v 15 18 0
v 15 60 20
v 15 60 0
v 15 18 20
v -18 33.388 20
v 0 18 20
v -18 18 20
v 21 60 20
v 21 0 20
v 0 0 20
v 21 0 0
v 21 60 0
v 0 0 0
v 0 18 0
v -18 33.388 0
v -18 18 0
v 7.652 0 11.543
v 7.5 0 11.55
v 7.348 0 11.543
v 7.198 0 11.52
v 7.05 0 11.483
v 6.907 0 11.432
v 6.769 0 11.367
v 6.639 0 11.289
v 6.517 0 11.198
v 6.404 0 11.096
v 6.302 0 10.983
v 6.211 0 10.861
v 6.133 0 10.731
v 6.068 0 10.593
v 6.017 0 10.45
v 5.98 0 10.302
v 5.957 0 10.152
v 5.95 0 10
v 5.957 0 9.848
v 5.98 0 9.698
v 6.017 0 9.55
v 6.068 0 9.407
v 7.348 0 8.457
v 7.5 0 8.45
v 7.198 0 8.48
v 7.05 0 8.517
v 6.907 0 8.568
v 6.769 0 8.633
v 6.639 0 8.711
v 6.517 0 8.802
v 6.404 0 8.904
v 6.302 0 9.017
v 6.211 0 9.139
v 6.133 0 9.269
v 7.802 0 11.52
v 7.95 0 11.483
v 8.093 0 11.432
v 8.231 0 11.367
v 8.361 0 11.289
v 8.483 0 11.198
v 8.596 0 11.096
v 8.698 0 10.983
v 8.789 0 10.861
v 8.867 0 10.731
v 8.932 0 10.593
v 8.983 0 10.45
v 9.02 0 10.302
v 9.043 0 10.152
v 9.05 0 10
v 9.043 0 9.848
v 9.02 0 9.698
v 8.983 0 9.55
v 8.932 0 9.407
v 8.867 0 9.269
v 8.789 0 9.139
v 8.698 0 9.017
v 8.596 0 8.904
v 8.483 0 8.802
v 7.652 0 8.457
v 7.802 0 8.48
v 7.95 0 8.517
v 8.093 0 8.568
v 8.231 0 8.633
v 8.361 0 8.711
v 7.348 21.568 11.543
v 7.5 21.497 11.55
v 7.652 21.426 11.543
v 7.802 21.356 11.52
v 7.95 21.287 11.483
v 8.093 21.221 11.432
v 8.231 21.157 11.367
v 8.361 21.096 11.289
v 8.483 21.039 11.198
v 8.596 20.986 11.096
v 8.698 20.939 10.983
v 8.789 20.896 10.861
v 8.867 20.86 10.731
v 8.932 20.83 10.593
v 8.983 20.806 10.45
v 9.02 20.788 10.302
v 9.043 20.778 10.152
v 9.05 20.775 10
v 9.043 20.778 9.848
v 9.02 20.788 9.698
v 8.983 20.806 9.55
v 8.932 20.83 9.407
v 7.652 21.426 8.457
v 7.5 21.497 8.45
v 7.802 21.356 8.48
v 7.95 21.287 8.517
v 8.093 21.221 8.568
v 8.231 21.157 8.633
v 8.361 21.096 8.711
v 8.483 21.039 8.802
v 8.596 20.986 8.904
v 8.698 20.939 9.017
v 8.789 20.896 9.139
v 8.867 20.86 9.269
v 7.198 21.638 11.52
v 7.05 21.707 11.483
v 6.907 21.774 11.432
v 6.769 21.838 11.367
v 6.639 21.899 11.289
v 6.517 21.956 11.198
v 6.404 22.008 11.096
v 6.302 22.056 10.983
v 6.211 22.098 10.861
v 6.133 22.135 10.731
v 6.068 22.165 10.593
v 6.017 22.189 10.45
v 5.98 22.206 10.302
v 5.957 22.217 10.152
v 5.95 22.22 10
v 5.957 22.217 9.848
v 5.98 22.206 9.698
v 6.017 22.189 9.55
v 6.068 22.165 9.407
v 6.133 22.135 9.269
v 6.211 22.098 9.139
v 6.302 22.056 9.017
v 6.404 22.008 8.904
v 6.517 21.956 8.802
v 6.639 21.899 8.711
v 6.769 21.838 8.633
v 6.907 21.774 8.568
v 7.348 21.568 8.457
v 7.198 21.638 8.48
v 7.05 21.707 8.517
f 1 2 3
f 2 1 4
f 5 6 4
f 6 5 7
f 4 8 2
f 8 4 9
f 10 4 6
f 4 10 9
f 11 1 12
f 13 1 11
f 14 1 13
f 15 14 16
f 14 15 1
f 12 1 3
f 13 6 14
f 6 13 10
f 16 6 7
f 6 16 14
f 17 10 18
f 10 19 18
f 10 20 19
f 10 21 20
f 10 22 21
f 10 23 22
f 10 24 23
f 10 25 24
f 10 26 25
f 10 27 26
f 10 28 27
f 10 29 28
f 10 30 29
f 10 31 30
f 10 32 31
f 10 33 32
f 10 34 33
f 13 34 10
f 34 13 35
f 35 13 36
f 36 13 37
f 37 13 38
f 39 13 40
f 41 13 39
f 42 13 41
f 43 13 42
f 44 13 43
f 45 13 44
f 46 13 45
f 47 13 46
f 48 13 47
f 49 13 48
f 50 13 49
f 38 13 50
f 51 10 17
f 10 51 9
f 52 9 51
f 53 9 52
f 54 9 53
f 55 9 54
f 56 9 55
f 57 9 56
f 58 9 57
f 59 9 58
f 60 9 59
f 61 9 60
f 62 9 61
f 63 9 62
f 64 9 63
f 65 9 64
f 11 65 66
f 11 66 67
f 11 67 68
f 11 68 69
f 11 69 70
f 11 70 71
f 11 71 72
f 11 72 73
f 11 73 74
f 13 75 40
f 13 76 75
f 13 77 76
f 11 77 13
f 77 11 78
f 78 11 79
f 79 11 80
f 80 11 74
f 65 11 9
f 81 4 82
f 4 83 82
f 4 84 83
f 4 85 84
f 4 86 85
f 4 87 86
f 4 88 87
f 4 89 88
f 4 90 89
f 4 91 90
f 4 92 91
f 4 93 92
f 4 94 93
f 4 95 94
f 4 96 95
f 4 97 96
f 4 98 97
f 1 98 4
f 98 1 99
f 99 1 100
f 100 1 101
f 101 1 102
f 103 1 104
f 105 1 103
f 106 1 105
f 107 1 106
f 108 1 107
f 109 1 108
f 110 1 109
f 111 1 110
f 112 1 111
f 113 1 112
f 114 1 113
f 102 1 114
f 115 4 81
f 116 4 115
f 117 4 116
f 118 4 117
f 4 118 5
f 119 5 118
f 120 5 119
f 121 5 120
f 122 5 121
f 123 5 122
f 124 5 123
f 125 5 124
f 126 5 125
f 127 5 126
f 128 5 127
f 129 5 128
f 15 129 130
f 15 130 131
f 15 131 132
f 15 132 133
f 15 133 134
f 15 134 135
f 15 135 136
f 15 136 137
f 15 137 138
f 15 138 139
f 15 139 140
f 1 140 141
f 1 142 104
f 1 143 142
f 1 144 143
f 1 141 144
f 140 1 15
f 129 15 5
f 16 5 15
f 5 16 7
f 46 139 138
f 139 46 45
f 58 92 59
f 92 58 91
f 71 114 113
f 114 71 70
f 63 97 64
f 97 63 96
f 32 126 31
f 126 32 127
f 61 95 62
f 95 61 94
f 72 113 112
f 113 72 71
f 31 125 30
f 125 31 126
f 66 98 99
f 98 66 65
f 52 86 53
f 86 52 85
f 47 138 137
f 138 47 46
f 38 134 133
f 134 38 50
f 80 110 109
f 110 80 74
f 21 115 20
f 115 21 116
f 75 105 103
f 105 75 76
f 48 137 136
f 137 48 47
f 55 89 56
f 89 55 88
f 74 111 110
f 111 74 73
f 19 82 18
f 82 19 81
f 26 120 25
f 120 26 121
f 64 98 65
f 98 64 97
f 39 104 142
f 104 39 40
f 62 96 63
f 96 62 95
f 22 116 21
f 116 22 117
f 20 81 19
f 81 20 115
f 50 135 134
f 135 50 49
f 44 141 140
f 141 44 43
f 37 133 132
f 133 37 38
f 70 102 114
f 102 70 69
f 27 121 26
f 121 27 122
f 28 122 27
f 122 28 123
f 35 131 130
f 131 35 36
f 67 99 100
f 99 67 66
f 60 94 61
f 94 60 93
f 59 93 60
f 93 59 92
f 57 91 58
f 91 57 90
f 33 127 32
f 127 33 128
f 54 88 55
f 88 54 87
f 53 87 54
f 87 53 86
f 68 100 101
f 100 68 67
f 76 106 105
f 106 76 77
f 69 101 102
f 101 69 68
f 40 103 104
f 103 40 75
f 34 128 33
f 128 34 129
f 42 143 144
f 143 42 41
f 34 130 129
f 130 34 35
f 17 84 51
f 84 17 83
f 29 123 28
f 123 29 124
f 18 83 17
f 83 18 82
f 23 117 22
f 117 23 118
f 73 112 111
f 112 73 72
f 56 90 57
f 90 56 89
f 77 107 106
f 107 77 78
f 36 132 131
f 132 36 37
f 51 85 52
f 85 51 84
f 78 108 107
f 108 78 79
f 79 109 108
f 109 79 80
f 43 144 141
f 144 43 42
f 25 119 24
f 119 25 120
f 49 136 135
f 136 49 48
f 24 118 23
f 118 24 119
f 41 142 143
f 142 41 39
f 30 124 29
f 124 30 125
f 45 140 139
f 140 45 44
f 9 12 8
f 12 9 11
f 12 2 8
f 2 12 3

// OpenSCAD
board_thickness = 15;
tool_thickness = 6;
tool_height = 20;
drill_diameter = 3.1;
angle = 25;
$fn = 64;

// Derived values, do not edit
a = (3 * tool_thickness + board_thickness);
b = a * tan(angle);

module angledWedge() {        
    linear_extrude(height = tool_height)
        polygon([[0,0], [a, 0], [0, b]]);
}


difference() {
    union() {
        cube([board_thickness, 3 * tool_thickness, tool_height]);        
        translate([- 3 * tool_thickness, 3 * tool_thickness, 0])
            angledWedge();
    }
    translate([board_thickness/2, 6 * tool_thickness, tool_height/2])
        rotate([90, 0, 0]) 
            cylinder(d = drill_diameter, h = 7 * tool_thickness);
}
translate([board_thickness, 0 , 0])
    cube([tool_thickness, 10 * tool_thickness, tool_height]);


    
